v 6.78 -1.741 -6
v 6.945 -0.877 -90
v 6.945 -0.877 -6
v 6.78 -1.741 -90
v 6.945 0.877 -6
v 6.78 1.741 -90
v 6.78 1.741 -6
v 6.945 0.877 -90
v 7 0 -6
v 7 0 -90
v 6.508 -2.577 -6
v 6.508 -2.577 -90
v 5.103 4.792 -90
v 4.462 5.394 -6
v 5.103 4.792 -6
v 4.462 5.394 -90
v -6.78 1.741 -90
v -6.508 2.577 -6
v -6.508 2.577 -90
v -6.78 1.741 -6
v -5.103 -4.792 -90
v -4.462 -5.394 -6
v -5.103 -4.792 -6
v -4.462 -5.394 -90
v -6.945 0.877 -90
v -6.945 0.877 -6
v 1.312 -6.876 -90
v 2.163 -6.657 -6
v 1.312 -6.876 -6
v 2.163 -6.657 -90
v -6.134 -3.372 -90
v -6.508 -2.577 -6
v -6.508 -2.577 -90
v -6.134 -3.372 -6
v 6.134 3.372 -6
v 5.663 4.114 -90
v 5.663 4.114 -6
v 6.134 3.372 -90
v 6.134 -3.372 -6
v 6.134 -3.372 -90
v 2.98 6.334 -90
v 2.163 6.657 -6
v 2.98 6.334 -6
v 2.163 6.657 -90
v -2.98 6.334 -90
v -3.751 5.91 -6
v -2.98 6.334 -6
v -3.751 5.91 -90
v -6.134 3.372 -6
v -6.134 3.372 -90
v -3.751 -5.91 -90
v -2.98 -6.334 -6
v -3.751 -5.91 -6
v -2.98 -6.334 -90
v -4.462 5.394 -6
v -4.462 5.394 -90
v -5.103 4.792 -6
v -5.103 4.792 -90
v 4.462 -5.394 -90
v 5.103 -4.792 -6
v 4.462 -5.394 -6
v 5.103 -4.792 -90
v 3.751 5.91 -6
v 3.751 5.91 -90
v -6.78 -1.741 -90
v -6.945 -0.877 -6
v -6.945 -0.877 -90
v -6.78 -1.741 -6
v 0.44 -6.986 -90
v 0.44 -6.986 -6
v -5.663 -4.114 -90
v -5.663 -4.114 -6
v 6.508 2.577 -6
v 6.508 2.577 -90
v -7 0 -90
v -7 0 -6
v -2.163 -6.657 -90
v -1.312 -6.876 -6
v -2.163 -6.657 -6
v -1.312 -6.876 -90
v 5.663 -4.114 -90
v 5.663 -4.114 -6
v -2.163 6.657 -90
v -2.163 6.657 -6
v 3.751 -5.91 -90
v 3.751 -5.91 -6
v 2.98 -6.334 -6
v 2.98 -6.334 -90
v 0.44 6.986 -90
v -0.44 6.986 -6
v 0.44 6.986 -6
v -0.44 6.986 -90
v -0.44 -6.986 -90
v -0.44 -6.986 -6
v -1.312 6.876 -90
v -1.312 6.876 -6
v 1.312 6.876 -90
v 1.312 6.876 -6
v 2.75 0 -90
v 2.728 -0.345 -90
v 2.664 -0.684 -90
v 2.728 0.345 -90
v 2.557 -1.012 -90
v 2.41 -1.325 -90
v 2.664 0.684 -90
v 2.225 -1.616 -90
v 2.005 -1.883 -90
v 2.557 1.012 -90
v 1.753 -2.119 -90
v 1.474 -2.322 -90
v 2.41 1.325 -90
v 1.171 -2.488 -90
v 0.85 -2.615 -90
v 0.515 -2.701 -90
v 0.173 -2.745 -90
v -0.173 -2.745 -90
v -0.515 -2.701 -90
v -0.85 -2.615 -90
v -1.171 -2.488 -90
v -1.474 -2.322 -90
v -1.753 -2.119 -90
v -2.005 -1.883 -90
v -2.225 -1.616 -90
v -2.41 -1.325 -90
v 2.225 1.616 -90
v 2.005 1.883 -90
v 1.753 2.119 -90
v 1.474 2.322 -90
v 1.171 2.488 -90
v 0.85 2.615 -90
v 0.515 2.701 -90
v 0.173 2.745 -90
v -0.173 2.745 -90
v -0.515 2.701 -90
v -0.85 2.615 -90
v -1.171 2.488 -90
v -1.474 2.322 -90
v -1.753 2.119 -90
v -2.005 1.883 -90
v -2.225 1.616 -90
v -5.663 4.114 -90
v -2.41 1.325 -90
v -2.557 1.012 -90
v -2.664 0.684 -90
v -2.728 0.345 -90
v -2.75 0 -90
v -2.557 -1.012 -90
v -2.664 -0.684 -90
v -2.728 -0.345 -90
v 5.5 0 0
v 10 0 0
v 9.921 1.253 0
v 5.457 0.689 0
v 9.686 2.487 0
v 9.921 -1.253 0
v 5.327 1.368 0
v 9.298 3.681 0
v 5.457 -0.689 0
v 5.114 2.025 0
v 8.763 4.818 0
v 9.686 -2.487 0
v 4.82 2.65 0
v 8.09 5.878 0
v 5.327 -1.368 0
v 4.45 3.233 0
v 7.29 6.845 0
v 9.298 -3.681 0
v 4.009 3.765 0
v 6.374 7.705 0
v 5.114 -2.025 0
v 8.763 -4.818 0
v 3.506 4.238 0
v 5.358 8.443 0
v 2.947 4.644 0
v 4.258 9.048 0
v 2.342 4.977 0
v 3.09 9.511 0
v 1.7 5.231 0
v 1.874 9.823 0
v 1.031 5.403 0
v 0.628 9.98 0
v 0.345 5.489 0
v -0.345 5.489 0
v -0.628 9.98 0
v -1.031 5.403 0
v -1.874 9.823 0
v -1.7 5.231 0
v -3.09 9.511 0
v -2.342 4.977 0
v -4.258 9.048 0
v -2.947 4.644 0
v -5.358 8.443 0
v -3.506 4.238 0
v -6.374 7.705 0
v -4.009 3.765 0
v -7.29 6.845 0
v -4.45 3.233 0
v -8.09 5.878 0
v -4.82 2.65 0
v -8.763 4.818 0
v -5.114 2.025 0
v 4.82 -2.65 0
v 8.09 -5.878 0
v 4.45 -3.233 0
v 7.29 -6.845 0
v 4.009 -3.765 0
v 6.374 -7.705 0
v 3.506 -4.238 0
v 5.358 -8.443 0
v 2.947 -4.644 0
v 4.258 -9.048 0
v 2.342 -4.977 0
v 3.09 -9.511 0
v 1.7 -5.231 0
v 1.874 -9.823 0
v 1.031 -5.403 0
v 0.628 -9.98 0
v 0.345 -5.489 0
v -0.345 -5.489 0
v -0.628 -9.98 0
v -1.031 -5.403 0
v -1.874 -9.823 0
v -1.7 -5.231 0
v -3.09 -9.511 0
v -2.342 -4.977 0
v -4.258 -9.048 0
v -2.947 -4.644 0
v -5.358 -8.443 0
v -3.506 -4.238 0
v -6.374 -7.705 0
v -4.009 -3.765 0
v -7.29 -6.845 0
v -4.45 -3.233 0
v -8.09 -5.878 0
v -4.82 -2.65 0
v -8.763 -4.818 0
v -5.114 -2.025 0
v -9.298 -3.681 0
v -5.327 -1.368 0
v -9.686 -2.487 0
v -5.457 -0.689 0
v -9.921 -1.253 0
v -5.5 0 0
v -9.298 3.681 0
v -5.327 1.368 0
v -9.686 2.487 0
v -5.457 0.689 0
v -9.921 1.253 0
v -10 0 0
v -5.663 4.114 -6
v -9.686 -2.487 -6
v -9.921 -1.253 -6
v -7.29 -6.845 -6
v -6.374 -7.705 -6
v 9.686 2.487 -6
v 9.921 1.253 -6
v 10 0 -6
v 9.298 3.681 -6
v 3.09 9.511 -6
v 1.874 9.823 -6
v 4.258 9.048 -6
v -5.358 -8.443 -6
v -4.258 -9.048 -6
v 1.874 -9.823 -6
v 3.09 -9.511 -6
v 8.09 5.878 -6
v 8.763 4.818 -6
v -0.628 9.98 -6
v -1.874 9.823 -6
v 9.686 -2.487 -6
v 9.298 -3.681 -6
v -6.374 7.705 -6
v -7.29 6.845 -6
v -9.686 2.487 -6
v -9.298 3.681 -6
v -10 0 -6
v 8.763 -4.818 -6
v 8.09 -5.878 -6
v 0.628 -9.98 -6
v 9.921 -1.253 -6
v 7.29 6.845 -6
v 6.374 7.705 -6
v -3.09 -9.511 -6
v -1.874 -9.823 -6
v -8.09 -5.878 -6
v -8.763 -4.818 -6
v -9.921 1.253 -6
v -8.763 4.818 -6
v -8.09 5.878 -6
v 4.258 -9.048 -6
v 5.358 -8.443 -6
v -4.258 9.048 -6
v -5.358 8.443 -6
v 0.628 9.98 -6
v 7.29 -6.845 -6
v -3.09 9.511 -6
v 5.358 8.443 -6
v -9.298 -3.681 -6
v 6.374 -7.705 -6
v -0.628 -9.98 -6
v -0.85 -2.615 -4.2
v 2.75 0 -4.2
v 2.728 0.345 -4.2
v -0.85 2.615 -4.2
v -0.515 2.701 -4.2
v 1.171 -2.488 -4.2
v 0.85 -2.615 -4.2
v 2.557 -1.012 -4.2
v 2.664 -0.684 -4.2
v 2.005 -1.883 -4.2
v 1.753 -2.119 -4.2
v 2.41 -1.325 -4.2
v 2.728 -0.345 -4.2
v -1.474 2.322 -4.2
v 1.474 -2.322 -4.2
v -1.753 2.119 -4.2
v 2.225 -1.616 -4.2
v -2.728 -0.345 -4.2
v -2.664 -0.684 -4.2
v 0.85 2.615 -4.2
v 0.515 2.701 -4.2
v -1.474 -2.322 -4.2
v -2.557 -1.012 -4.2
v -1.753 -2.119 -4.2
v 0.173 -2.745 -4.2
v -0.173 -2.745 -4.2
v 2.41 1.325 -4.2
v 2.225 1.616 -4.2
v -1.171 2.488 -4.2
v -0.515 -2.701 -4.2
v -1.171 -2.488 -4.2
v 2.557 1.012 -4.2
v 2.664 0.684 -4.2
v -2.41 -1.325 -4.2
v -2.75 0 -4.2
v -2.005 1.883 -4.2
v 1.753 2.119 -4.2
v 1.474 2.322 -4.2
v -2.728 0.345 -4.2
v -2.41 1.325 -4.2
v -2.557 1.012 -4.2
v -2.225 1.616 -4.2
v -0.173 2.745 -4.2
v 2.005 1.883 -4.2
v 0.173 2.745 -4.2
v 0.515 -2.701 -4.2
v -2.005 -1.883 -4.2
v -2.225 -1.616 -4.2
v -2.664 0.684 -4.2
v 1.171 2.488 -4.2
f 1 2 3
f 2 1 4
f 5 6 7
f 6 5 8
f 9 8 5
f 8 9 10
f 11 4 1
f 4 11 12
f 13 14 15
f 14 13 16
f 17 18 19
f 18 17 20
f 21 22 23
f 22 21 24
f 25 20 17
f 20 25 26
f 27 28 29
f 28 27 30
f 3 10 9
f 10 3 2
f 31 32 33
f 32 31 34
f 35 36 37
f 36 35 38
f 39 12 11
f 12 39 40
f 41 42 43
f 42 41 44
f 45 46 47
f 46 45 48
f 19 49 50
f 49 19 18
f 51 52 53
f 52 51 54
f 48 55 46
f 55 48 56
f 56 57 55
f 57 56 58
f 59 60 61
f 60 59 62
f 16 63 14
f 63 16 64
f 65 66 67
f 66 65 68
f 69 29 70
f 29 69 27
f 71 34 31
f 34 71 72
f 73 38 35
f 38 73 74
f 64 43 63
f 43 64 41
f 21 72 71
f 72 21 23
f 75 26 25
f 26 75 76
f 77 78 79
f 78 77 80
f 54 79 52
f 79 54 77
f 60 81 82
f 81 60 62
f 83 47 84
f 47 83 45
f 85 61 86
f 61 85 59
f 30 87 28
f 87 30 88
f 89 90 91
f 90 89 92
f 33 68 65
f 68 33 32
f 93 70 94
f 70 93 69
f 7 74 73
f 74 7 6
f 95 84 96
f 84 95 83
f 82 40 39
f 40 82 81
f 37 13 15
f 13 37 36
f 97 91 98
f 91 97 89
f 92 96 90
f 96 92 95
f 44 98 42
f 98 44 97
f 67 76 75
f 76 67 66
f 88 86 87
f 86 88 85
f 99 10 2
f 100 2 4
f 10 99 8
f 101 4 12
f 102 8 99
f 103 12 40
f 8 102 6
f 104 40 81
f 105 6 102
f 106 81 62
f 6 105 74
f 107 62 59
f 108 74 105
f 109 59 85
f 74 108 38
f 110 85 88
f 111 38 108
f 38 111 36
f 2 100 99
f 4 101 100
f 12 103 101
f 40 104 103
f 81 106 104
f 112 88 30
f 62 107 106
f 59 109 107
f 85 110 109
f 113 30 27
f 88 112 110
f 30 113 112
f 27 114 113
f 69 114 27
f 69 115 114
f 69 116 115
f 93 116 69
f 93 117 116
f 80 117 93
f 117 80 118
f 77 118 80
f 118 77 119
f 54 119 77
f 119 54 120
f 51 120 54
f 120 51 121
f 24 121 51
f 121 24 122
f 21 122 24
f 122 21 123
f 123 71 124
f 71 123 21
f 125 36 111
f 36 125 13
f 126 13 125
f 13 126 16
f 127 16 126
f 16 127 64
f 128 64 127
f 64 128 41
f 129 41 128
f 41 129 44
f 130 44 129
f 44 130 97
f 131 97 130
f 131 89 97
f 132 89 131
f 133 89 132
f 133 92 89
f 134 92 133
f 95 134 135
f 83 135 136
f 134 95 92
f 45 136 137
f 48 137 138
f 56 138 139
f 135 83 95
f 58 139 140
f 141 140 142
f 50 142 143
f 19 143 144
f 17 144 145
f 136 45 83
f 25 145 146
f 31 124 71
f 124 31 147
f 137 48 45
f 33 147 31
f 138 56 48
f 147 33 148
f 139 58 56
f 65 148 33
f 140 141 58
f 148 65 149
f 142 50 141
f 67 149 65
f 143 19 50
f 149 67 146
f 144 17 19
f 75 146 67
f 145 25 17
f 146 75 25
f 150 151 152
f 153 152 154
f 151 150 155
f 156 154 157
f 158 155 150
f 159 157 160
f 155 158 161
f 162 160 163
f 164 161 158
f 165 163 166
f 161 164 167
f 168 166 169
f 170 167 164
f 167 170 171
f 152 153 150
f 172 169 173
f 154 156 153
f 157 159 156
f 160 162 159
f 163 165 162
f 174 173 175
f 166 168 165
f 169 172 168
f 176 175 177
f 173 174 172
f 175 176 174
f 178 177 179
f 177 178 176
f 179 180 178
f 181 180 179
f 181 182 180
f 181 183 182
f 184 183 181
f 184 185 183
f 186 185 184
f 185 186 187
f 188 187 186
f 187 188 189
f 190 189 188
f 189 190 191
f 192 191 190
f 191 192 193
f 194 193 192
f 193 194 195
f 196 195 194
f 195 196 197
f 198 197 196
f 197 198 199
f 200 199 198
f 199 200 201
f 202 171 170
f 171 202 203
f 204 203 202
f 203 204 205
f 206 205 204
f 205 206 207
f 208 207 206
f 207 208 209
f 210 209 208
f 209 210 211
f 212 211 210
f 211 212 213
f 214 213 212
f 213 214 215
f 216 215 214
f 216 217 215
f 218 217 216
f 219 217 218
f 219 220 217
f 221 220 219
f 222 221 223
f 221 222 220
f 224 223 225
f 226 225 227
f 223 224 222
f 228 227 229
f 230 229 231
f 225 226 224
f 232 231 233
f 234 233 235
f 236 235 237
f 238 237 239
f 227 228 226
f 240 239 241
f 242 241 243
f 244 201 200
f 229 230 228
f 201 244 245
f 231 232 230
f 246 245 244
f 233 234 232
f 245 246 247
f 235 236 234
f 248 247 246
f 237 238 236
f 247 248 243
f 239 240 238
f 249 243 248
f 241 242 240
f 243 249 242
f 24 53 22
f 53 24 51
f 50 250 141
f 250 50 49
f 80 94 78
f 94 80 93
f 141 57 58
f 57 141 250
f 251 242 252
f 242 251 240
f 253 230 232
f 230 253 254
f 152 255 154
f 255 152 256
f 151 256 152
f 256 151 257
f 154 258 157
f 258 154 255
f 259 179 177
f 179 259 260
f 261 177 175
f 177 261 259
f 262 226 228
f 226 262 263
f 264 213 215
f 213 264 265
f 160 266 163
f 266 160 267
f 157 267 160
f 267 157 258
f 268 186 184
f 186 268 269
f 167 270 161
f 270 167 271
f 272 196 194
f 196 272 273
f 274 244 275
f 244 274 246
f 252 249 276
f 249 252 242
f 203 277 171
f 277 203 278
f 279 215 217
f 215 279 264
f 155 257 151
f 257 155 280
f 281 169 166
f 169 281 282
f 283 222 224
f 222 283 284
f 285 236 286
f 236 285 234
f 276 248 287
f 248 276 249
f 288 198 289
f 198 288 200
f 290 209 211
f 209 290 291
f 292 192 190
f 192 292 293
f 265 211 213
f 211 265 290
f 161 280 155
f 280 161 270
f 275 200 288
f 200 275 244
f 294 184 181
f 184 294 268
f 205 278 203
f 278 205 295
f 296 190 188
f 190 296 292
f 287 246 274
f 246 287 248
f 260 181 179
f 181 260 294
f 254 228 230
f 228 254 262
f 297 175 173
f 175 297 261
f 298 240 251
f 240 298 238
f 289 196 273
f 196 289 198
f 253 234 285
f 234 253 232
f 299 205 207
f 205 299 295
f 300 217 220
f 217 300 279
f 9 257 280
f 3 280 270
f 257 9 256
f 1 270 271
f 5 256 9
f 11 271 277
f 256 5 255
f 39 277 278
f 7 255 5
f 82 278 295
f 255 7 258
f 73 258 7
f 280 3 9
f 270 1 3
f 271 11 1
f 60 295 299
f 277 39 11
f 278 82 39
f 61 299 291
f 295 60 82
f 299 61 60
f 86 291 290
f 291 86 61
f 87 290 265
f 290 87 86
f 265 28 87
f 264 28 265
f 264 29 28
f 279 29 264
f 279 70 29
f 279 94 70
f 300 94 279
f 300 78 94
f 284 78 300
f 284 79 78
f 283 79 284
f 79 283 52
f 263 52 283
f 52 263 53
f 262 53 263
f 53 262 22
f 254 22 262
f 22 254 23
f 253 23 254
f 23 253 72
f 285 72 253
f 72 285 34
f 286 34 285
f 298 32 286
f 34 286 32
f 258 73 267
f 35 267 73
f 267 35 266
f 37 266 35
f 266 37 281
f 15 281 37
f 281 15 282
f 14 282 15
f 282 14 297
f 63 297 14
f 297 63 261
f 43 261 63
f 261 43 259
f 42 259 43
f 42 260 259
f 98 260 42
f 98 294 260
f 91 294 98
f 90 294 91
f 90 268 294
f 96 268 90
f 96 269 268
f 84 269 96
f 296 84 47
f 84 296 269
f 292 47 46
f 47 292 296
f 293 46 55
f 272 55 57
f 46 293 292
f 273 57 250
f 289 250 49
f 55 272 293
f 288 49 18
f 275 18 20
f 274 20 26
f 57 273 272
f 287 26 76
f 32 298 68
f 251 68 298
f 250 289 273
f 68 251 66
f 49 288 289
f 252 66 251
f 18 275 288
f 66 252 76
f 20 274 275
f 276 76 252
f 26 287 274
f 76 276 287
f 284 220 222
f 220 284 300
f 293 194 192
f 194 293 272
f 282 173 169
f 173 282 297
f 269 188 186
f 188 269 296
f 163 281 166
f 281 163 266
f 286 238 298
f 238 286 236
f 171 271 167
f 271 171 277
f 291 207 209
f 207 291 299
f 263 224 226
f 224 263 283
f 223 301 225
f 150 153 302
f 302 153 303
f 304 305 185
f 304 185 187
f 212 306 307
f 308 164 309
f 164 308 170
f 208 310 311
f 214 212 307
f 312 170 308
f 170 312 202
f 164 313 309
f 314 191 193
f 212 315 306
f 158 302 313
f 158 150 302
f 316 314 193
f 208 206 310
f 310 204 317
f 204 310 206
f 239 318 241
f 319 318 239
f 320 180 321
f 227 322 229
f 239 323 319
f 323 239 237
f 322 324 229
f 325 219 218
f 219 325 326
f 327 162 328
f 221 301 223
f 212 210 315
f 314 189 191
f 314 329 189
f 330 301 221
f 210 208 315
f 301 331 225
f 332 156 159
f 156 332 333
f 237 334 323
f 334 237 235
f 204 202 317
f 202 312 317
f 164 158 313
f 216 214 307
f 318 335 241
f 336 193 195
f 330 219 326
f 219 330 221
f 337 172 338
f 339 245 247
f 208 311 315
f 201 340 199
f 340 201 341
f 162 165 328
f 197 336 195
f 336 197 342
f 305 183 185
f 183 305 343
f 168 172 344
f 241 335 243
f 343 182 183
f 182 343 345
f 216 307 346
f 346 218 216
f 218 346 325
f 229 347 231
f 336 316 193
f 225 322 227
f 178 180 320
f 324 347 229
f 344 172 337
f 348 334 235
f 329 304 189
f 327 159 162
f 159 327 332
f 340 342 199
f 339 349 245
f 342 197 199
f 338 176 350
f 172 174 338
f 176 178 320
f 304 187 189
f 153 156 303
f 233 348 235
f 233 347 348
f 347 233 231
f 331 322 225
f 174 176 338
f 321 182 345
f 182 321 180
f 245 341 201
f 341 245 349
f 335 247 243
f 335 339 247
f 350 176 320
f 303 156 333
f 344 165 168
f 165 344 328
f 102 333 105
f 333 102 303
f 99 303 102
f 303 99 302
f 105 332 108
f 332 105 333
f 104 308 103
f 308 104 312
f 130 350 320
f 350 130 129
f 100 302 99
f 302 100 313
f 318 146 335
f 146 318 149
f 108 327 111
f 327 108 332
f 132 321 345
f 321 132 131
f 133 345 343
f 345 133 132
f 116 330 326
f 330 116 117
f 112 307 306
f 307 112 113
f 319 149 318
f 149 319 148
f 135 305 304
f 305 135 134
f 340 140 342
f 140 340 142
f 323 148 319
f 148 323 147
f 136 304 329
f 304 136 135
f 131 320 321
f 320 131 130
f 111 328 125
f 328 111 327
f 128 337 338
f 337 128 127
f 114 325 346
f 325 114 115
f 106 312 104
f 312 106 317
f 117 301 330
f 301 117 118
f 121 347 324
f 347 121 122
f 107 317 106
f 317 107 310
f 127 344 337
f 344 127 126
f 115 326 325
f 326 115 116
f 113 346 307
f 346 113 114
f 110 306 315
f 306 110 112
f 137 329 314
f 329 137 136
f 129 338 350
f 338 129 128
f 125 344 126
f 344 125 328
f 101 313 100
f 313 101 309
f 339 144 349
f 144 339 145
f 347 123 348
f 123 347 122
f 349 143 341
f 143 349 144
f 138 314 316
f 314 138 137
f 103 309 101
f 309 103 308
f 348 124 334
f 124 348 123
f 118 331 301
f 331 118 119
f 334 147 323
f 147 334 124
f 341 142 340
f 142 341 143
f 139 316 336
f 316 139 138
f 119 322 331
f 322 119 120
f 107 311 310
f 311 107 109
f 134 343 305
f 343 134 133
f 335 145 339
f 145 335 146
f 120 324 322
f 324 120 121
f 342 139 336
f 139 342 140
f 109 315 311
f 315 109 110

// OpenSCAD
$fn = 50;


difference() {
	union() {
		translate(v = [0, 0, -90.0000000000]) {
			cylinder(h = 90, r = 7.0000000000);
		}
		translate(v = [0, 0, -6.0000000000]) {
			cylinder(h = 6, r = 10.0000000000);
		}
	}
	union() {
		translate(v = [0, 0, 0]) {
			rotate(a = [0, 0, 0]) {
				difference() {
					union() {
						#translate(v = [0, 0, -90.0000000000]) {
							cylinder(h = 90, r = 2.2500000000);
						}
						#translate(v = [0, 0, -4.2000000000]) {
							cylinder(h = 4.2000000000, r = 7.0000000000, r1 = 2.7500000000, r2 = 5.5000000000);
						}
						#translate(v = [0, 0, -90.0000000000]) {
							cylinder(h = 90, r = 2.7500000000);
						}
						#translate(v = [0, 0, -90.0000000000]) {
							cylinder(h = 90, r = 2.2500000000);
						}
					}
					union();
				}
			}
		}
	}
}
